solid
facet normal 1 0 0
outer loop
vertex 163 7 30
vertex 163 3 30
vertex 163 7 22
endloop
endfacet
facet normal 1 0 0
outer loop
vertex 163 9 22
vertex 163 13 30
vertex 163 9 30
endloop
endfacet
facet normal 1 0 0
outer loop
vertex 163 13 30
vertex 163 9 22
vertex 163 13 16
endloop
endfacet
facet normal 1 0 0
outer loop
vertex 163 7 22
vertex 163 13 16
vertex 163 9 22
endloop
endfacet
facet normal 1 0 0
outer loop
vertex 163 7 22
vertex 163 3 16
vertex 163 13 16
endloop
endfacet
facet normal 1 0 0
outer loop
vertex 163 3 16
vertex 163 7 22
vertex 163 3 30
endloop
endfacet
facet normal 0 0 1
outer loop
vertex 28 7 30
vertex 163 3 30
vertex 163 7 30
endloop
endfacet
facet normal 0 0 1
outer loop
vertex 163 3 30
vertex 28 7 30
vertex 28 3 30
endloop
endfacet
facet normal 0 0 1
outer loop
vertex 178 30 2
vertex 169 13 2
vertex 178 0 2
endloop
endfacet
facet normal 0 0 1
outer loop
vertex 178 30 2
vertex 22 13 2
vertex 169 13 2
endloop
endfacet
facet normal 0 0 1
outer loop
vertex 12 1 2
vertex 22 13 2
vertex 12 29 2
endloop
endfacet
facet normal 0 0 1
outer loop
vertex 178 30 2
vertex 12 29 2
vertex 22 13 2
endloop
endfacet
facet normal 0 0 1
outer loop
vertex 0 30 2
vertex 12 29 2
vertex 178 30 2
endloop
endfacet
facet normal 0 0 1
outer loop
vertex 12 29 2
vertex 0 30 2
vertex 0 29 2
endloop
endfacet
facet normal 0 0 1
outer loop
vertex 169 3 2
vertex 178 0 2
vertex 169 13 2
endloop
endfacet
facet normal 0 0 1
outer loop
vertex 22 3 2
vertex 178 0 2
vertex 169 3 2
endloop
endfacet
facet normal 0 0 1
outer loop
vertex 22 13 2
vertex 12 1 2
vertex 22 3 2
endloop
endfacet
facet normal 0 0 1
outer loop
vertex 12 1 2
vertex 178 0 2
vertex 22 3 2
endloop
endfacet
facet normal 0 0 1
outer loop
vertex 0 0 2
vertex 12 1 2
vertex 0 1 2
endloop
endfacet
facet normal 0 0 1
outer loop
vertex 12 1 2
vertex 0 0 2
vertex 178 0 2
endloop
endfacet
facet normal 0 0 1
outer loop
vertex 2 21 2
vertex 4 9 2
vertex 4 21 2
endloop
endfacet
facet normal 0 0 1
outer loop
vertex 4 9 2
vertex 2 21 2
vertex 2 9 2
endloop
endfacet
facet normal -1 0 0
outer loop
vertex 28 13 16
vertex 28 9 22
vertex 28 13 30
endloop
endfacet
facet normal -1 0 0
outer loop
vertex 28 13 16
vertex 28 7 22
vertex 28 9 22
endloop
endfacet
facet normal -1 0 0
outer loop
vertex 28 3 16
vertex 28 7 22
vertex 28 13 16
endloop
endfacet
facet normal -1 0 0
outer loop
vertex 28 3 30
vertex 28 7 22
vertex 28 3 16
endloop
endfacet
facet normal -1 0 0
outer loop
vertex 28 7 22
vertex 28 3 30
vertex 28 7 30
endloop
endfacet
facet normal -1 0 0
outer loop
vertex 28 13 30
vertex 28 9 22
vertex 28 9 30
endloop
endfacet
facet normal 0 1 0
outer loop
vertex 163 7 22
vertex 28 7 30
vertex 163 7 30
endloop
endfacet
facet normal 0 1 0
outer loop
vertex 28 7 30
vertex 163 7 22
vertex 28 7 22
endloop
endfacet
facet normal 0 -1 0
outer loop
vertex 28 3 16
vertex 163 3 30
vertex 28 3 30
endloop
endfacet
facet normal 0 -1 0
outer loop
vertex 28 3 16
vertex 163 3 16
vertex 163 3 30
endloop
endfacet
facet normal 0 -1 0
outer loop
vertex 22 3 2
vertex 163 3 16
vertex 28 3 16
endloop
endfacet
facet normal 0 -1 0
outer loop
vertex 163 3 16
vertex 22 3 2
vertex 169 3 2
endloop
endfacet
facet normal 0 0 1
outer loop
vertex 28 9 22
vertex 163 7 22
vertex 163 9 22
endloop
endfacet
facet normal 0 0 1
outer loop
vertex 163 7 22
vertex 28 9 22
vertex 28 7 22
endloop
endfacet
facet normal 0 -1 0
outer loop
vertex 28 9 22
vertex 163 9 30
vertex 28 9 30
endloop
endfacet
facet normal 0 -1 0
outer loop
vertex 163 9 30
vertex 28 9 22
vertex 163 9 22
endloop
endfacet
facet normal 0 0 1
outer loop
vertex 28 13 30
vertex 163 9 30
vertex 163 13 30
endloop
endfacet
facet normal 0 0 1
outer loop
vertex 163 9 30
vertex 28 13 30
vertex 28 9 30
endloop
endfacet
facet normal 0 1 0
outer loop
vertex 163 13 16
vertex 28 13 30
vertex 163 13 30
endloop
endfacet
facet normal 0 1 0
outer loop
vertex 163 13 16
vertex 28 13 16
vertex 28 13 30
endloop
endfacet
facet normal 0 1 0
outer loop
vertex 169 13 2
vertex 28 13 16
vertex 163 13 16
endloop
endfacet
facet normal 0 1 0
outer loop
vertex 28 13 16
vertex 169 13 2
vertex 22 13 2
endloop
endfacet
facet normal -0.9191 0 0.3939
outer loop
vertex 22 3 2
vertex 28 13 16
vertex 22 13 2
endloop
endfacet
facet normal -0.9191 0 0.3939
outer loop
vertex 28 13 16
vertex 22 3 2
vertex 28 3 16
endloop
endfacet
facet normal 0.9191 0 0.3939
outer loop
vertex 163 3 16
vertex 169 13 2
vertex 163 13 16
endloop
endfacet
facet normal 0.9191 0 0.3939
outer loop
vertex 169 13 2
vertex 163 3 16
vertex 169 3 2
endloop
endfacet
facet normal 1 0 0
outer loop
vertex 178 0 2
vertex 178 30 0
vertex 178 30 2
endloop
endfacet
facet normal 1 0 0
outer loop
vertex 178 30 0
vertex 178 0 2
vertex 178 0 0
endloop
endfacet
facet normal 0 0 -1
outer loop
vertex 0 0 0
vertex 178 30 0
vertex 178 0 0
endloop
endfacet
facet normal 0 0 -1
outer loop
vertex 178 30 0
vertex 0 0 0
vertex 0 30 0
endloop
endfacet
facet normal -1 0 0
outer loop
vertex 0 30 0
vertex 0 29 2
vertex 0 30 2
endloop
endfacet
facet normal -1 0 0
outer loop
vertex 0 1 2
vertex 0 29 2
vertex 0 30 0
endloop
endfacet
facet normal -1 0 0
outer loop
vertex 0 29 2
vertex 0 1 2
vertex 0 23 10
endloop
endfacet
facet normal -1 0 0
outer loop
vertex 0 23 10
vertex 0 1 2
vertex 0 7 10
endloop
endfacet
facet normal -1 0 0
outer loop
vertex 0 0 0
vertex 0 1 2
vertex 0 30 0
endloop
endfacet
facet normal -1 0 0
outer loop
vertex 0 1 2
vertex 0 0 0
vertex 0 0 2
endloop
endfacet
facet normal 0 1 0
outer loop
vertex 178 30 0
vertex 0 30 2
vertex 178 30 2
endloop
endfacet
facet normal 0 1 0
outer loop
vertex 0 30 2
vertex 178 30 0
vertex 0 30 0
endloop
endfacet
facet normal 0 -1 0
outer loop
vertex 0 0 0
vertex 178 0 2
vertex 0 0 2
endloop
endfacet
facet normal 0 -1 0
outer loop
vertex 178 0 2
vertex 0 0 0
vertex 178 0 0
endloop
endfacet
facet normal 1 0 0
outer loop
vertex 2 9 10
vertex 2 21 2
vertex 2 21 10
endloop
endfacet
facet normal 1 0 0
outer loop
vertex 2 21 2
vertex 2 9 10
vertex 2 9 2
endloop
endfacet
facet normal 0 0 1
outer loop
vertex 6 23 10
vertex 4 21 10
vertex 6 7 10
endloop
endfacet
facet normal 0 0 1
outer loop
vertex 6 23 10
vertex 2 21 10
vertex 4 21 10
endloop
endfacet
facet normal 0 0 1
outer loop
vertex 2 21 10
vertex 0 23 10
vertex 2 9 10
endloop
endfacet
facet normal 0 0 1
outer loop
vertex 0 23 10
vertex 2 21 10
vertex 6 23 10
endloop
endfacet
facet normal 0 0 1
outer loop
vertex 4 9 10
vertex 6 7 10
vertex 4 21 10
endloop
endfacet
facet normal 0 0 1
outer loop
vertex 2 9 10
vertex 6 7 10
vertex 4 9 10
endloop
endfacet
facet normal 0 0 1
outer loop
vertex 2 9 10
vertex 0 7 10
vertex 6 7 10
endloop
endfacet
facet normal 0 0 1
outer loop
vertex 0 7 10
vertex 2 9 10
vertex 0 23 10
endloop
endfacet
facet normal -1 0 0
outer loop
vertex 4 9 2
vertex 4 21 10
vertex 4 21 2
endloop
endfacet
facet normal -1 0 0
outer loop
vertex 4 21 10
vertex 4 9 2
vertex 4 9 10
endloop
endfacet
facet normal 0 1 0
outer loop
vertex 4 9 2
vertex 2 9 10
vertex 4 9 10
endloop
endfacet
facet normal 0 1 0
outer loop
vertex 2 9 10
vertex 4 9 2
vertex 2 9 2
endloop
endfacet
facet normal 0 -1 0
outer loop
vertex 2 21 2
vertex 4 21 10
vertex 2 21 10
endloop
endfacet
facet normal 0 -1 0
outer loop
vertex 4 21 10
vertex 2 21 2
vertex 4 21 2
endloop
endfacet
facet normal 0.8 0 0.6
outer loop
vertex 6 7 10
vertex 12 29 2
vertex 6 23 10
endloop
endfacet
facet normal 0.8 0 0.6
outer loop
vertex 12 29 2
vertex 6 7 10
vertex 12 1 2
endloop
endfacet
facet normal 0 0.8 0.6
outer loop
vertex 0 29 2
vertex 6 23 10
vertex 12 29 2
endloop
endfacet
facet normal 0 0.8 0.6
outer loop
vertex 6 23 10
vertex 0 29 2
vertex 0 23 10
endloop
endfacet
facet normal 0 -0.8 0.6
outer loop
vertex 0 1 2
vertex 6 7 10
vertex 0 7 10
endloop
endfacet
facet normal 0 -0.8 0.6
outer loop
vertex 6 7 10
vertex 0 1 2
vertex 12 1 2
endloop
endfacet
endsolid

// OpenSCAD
module prism(l, w, h)
{
    polyhedron(points =
                   [
                       [ 0, 0, h ],              // 0    front top corner
                       [ 0, 0, 0 ], [ w, 0, 0 ], // 1, 2 front left & right bottom corners
                       [ 0, l, h ],              // 3    back top corner
                       [ 0, l, 0 ], [ w, l, 0 ]  // 4, 5 back left & right bottom corners
                   ],
               faces = [
                   // points for all faces must be ordered clockwise when looking in
                   [ 0, 2, 1 ],    // top face
                   [ 3, 4, 5 ],    // base face
                   [ 0, 1, 4, 3 ], // h face
                   [ 1, 2, 5, 4 ], // w face
                   [ 0, 3, 5, 2 ], // hypotenuse face
               ]);
}

module pyramid(w, l, h, mw, ml)
{
    polyhedron(points = [ [ 0, 0, 0 ], [ w, 0, 0 ], [ 0, l, 0 ], [ w, l, 0 ], [ mw, ml, h ] ], faces = [
        [ 4, 1, 0 ], [ 4, 3, 1 ], [ 4, 2, 3 ], [ 4, 0, 2 ],
        // base
        [ 0, 1, 2 ], [ 2, 1, 3 ]
    ]);
}

module soporte_tarjeta_isa8()
{

    desplazamiento = 2;

    posicion_tarjeta = 28;
    longitud_tarjeta = 81;
    altura_borde_tarjeta = 28;
    altura_interior_tarjeta = 20;

    color("purple") translate([ posicion_tarjeta, desplazamiento + 1, 2 ])
        cube([ longitud_tarjeta, 4, altura_borde_tarjeta ]);

    color("pink") translate([ posicion_tarjeta, desplazamiento + 5, 2 ])
        cube([ longitud_tarjeta, 2, altura_interior_tarjeta ]);

    color("purple") translate([ posicion_tarjeta, desplazamiento + 7, 2 ])
        cube([ longitud_tarjeta, 4, altura_borde_tarjeta ]);

    color("lightgreen") rotate([ 0, 0, 180 ]) translate([ -posicion_tarjeta, (-desplazamiento - 11), 2 ])
        prism(10, 6, 14);

    color("lightgreen") translate([ posicion_tarjeta + longitud_tarjeta, desplazamiento + 1, 2 ]) prism(10, 6, 14);
}

module soporte_tarjeta_isa16()
{

    desplazamiento = 2;

    posicion_tarjeta = 28;
    longitud_tarjeta = 135;
    altura_borde_tarjeta = 28;
    altura_interior_tarjeta = 20;

    color("purple") translate([ posicion_tarjeta, desplazamiento + 1, 2 ])
        cube([ longitud_tarjeta, 4, altura_borde_tarjeta ]);

    color("pink") translate([ posicion_tarjeta, desplazamiento + 5, 2 ])
        cube([ longitud_tarjeta, 2, altura_interior_tarjeta ]);

    color("purple") translate([ posicion_tarjeta, desplazamiento + 7, 2 ])
        cube([ longitud_tarjeta, 4, altura_borde_tarjeta ]);

    color("lightgreen") rotate([ 0, 0, 180 ]) translate([ -posicion_tarjeta, (-desplazamiento - 11), 2 ])
        prism(10, 6, 14);

    color("lightgreen") translate([ posicion_tarjeta + longitud_tarjeta, desplazamiento + 1, 2 ]) prism(10, 6, 14);
}

module soporte_tarjeta_pci()
{

    desplazamiento = 16;

    posicion_tarjeta = 43;
    longitud_tarjeta = 80;
    altura_borde_tarjeta = 28;
    altura_interior_tarjeta = 20;

    color("purple") translate([ posicion_tarjeta, desplazamiento + 1, 2 ])
        cube([ longitud_tarjeta, 4, altura_borde_tarjeta ]);

    color("pink") translate([ posicion_tarjeta, desplazamiento + 5, 2 ])
        cube([ longitud_tarjeta, 2, altura_interior_tarjeta ]);

    color("purple") translate([ posicion_tarjeta, desplazamiento + 7, 2 ])
        cube([ longitud_tarjeta, 4, altura_borde_tarjeta ]);

    color("lightgreen") rotate([ 0, 0, 180 ]) translate([ -posicion_tarjeta, (-desplazamiento - 11), 2 ])
        prism(10, 6, 14);

    color("lightgreen") translate([ posicion_tarjeta + longitud_tarjeta, desplazamiento + 1, 2 ]) prism(10, 6, 14);
}

module single_slot(tipo)
{

    color("cyan") cube([ 178, 30, 2 ]);

    color("red") translate([ 0, 7, 2 ]) cube([ 2, 16, 8 ]);

    color("red") translate([ 4, 7, 2 ]) cube([ 2, 16, 8 ]);

    color("red") translate([ 2, 7, 2 ]) cube([ 2, 2, 8 ]);

    color("red") translate([ 2, 21, 2 ]) cube([ 2, 2, 8 ]);

    color("lightgreen") translate([ 6, 7, 2 ]) prism(16, 6, 8);

    color("lightgreen") translate([ 6, 23, 2 ]) rotate([ 0, 0, 90 ]) prism(6, 6, 8);

    color("lightgreen") translate([ 0, 7, 2 ]) rotate([ 0, 0, -90 ]) prism(6, 6, 8);

    color("lightgreen") translate([ 6, 23, 2 ]) pyramid(6, 6, 8, 0, 0);

    color("lightgreen") translate([ 6, 7, 2 ]) rotate([ 0, 0, 270 ]) pyramid(6, 6, 8, 0, 0);

    if (tipo=="ISA8") {
        soporte_tarjeta_isa8();
    } else if (tipo=="ISA16") {
        soporte_tarjeta_isa16();
    } else if (tipo=="PCI") {
        soporte_tarjeta_pci();
    }

}

single_slot("ISA16");
